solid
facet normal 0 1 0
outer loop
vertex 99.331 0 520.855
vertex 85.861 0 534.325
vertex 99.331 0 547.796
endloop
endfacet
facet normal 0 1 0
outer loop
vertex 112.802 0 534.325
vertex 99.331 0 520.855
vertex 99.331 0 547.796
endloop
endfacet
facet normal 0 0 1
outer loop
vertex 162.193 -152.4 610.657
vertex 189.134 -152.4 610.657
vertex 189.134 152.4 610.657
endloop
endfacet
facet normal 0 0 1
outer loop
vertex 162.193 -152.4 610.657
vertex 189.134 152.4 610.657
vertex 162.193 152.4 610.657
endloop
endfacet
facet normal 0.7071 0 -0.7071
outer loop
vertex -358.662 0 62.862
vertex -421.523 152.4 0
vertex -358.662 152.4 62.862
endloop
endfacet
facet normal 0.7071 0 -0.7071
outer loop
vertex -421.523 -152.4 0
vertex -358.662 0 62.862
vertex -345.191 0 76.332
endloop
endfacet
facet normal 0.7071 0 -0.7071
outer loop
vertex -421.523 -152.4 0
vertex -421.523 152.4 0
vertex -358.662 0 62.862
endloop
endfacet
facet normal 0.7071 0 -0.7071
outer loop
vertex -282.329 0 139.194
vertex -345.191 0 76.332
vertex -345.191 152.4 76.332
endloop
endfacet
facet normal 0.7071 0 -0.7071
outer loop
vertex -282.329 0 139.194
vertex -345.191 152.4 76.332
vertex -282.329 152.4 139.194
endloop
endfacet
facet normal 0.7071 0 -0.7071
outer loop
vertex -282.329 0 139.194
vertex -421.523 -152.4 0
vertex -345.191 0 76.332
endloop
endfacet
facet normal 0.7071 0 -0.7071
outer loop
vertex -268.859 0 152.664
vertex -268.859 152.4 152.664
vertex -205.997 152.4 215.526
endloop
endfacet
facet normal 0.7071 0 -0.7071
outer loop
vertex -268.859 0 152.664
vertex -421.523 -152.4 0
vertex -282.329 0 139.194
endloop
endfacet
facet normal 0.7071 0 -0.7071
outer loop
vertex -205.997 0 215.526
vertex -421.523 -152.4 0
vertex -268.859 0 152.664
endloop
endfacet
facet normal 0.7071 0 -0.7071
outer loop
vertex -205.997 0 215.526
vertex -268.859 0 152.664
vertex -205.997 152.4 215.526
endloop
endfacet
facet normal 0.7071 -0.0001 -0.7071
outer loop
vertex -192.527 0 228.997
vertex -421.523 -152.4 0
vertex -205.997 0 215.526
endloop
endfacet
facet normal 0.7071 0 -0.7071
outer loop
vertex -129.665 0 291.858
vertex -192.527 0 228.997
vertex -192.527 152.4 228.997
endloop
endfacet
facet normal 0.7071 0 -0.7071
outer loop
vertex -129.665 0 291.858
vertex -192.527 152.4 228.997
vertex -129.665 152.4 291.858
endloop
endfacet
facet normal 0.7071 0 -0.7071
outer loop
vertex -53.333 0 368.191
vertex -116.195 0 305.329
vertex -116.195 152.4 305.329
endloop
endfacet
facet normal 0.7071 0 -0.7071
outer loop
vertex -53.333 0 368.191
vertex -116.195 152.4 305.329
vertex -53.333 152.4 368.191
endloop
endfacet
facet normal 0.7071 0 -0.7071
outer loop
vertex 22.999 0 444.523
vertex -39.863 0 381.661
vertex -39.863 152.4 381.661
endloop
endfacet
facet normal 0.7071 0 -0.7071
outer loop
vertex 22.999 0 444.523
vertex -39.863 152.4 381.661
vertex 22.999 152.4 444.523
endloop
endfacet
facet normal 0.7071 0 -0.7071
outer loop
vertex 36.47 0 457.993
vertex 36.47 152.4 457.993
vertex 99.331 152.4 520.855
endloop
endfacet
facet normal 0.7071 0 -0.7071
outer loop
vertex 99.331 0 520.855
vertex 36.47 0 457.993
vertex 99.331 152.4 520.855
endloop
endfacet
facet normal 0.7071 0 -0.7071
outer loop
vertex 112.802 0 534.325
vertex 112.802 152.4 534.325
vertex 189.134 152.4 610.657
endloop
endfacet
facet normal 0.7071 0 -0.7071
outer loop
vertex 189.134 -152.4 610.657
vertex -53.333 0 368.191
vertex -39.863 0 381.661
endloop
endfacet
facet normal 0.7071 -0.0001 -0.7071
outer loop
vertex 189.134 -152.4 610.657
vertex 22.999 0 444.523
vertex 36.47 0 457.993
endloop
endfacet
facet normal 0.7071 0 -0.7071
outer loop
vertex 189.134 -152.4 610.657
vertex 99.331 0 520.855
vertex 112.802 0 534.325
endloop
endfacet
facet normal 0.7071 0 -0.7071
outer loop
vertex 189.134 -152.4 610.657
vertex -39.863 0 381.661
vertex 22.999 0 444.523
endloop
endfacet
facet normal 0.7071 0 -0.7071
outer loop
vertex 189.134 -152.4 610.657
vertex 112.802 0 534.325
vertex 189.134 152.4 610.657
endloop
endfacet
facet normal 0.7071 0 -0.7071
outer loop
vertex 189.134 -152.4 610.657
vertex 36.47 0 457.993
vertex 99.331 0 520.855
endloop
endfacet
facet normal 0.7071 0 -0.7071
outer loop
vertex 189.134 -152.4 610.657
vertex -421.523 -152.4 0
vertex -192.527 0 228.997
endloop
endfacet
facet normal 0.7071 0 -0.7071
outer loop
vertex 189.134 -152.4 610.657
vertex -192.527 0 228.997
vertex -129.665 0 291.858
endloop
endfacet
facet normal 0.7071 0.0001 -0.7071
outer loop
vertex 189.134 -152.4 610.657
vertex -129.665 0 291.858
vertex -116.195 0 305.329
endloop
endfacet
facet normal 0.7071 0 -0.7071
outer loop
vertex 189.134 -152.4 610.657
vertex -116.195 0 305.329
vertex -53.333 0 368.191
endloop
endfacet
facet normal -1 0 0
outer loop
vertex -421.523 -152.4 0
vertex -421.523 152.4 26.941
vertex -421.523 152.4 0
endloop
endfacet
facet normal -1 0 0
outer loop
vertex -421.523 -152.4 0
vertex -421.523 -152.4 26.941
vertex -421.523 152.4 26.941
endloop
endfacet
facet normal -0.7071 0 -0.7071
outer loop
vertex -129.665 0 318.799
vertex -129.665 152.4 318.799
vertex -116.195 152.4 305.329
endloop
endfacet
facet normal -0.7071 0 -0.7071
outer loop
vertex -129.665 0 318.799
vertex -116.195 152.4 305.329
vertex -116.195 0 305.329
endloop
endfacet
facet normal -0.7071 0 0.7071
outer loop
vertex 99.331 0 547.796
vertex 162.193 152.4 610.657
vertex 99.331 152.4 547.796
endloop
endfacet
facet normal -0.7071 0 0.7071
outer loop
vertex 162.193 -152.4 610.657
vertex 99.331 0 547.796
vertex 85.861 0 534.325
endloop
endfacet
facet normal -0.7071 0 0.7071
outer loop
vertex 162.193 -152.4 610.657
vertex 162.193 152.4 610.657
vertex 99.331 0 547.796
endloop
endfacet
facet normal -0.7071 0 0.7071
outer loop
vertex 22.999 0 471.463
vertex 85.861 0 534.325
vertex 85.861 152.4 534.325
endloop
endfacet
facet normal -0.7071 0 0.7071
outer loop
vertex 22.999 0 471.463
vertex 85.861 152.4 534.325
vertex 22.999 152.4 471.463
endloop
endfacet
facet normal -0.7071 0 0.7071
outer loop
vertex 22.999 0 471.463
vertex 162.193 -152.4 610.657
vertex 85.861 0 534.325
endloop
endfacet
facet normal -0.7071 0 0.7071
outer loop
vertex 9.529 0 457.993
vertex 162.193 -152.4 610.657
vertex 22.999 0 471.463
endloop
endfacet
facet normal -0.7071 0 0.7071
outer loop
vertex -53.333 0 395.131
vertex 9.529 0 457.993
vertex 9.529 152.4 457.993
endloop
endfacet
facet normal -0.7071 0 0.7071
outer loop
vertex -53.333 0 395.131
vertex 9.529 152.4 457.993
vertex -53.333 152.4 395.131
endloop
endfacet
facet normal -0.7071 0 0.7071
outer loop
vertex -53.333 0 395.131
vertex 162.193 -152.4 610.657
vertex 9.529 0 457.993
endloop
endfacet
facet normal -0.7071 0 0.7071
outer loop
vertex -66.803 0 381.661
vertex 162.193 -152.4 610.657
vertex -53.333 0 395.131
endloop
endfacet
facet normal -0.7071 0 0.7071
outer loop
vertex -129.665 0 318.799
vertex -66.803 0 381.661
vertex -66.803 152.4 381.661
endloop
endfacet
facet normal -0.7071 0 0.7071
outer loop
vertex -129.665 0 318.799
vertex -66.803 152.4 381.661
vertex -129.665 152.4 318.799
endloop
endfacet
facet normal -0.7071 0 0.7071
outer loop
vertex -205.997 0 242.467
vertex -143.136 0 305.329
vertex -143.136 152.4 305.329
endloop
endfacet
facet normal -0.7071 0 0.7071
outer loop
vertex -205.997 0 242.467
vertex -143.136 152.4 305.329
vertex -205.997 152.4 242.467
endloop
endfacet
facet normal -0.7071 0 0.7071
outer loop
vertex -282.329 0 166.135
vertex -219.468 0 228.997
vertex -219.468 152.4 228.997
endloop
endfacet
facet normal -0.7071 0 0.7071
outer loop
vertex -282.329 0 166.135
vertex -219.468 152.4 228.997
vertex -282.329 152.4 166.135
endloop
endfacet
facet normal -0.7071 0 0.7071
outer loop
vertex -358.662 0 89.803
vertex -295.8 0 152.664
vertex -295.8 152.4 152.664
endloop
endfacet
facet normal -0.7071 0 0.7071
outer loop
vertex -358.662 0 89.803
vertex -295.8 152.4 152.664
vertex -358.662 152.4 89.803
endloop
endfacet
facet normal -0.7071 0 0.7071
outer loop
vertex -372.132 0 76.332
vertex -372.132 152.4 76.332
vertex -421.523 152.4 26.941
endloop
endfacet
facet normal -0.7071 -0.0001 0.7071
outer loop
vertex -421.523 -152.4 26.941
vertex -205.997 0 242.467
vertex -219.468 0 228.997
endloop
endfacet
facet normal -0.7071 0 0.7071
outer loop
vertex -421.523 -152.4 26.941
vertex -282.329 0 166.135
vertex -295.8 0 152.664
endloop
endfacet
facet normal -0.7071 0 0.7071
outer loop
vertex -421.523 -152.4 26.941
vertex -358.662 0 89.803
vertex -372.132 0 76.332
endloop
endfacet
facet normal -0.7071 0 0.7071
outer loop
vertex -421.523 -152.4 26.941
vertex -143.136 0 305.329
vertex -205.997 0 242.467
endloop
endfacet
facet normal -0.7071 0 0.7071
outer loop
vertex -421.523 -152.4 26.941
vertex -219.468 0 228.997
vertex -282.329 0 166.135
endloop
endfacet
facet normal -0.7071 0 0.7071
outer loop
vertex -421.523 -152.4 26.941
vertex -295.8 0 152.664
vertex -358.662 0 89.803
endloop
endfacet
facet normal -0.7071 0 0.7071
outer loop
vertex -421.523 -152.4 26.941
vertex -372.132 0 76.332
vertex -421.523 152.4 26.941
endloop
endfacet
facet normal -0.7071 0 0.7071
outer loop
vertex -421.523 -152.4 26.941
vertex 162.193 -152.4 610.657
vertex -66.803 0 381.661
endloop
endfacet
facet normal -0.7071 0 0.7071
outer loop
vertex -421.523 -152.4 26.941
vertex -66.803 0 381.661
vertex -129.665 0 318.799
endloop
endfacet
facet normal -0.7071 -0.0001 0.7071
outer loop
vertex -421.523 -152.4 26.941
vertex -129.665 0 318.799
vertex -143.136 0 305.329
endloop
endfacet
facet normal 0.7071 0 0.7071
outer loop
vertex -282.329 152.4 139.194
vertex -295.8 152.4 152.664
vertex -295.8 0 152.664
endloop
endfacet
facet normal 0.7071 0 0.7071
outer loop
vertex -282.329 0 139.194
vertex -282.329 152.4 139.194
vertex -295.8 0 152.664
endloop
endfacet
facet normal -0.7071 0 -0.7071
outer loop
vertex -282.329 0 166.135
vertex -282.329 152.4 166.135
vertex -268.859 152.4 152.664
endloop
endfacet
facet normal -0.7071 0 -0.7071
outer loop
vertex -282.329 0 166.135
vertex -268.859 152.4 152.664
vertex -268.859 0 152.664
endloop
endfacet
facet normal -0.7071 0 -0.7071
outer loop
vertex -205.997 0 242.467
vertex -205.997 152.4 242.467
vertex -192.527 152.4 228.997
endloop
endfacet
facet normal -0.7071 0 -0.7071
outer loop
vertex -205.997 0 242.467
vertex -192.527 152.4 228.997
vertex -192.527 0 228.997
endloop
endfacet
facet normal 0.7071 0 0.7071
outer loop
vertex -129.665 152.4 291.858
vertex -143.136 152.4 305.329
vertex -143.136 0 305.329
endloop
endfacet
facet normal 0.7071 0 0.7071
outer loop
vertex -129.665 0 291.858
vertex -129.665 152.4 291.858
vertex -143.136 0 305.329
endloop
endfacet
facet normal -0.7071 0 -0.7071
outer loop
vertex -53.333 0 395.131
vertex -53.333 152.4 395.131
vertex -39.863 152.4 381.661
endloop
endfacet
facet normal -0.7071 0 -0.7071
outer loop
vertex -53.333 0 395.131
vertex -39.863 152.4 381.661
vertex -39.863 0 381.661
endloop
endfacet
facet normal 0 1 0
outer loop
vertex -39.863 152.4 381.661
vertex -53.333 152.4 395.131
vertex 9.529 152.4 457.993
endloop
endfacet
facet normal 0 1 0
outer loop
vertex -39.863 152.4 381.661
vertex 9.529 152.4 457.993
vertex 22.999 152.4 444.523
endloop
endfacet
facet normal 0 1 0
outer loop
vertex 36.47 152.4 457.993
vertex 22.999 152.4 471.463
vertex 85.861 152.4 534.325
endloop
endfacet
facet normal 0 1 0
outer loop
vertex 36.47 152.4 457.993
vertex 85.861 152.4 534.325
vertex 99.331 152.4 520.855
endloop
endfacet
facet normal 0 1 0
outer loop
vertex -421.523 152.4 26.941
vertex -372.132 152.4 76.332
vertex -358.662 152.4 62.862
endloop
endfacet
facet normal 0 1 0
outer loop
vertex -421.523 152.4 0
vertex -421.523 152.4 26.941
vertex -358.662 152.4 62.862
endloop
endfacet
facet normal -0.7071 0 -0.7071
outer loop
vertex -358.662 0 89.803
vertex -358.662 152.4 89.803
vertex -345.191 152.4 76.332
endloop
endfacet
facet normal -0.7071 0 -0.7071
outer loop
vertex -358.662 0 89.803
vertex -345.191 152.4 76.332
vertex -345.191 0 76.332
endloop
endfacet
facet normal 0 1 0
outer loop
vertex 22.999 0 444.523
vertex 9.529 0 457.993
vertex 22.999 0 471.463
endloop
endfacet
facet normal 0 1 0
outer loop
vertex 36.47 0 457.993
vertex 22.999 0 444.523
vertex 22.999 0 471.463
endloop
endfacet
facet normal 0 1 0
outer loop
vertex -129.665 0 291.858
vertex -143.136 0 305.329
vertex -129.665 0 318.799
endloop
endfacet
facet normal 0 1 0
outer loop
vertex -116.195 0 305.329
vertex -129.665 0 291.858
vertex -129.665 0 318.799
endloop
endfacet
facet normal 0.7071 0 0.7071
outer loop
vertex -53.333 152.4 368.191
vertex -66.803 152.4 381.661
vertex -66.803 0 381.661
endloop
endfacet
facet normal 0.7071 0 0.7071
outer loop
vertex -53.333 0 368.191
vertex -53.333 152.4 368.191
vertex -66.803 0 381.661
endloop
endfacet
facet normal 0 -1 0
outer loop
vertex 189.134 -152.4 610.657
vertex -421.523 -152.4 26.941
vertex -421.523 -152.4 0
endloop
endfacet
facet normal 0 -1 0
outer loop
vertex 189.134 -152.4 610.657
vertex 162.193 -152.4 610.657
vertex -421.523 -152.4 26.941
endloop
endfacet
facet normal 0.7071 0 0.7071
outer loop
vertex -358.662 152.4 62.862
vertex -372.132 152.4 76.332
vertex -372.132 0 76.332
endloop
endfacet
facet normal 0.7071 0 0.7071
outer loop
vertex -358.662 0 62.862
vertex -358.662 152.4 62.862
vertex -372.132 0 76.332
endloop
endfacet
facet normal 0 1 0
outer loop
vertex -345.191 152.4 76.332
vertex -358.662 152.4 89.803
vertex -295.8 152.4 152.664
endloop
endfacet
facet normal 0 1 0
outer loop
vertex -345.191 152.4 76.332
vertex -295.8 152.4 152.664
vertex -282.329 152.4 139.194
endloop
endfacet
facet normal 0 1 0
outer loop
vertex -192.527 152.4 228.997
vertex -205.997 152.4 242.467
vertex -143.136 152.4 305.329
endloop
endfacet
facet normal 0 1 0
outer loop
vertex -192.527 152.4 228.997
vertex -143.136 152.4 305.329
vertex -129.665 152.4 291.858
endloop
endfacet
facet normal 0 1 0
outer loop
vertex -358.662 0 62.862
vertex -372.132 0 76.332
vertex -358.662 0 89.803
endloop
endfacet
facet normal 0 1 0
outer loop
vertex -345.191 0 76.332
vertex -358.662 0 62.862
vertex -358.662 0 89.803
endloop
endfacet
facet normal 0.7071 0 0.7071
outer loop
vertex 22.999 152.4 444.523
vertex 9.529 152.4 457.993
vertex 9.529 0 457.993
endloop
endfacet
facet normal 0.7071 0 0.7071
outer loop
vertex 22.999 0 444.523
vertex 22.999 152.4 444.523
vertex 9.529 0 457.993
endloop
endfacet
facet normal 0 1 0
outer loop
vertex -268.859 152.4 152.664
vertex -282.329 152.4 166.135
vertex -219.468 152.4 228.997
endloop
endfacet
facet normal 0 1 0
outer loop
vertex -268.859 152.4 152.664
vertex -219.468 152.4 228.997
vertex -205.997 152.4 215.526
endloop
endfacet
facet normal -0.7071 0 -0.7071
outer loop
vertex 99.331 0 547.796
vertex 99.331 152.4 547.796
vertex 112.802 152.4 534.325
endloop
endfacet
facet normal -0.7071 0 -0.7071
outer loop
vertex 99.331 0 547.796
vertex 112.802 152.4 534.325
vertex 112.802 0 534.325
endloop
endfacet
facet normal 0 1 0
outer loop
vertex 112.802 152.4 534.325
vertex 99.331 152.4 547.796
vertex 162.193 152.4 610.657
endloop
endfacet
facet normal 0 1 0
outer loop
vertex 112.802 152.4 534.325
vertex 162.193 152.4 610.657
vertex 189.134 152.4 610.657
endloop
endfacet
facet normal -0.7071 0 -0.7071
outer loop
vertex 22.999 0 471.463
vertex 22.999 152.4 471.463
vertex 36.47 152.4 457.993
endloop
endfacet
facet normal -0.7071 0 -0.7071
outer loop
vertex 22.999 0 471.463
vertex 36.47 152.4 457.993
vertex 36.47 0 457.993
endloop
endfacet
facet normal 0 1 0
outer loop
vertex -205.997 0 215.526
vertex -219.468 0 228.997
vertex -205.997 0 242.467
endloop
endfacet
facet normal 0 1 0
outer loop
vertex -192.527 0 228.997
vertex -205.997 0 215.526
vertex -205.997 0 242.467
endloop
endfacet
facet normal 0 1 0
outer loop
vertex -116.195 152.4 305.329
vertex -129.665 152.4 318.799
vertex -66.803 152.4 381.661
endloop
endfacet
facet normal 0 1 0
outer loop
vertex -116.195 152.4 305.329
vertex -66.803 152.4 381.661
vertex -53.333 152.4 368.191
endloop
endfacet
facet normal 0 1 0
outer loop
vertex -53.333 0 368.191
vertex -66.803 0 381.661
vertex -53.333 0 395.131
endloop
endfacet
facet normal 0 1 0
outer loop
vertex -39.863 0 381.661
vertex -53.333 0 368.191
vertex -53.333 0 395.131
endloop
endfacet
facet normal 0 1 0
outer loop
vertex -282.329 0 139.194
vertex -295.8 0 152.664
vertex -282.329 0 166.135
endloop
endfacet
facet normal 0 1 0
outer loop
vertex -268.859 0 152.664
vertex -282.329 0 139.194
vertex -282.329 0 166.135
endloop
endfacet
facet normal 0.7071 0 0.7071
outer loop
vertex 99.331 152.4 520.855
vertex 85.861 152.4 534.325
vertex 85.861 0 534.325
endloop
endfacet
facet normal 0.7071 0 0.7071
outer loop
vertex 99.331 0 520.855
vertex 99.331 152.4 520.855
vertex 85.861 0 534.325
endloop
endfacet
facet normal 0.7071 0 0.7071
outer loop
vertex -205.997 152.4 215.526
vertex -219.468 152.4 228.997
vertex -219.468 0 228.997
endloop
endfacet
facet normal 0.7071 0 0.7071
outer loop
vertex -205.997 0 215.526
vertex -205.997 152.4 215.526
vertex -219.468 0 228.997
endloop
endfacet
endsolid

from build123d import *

# Parameters (mm, degrees)
F1_DEPTH = 152.4
F2_W     = 152.4
F2_H     = 19.05
F3_DEPTH = 19.05


with BuildPart() as f1:
    # F0 (on Front) → F1 (new body, symmetric)
    with BuildSketch(Plane.XZ):
        Polygon((-421.5234547212, 26.9407683632), (-421.5234547212, 0), (189.1339615115, 610.6574162327), (162.1931931483, 610.6574162327), align=None)
    extrude(amount=F1_DEPTH, both=True)

    # F2 (on face) → F3 (cut)
    with BuildSketch(Plane(origin=(-224.2321115422, 0, 224.2321115422), x_dir=(0, -1, 0), z_dir=(-0.7071067812, 0, 0.7071067812))):
        with Locations((-76.2, -199.6370932625)):
            Rectangle(F2_W, F2_H)
        with Locations((-76.2, -91.6870932625)):
            Rectangle(F2_W, F2_H)
        with Locations((-76.2, 16.2629067375)):
            Rectangle(F2_W, F2_H)
        with Locations((-76.2, 124.2129067375)):
            Rectangle(F2_W, F2_H)
        with Locations((-76.2, 232.1629067375)):
            Rectangle(F2_W, F2_H)
        with Locations((-76.2, 340.1129067375)):
            Rectangle(F2_W, F2_H)
        with Locations((-76.2, 448.0629067375)):
            Rectangle(F2_W, F2_H)
    extrude(amount=-F3_DEPTH, mode=Mode.SUBTRACT)


solid = f1.part
